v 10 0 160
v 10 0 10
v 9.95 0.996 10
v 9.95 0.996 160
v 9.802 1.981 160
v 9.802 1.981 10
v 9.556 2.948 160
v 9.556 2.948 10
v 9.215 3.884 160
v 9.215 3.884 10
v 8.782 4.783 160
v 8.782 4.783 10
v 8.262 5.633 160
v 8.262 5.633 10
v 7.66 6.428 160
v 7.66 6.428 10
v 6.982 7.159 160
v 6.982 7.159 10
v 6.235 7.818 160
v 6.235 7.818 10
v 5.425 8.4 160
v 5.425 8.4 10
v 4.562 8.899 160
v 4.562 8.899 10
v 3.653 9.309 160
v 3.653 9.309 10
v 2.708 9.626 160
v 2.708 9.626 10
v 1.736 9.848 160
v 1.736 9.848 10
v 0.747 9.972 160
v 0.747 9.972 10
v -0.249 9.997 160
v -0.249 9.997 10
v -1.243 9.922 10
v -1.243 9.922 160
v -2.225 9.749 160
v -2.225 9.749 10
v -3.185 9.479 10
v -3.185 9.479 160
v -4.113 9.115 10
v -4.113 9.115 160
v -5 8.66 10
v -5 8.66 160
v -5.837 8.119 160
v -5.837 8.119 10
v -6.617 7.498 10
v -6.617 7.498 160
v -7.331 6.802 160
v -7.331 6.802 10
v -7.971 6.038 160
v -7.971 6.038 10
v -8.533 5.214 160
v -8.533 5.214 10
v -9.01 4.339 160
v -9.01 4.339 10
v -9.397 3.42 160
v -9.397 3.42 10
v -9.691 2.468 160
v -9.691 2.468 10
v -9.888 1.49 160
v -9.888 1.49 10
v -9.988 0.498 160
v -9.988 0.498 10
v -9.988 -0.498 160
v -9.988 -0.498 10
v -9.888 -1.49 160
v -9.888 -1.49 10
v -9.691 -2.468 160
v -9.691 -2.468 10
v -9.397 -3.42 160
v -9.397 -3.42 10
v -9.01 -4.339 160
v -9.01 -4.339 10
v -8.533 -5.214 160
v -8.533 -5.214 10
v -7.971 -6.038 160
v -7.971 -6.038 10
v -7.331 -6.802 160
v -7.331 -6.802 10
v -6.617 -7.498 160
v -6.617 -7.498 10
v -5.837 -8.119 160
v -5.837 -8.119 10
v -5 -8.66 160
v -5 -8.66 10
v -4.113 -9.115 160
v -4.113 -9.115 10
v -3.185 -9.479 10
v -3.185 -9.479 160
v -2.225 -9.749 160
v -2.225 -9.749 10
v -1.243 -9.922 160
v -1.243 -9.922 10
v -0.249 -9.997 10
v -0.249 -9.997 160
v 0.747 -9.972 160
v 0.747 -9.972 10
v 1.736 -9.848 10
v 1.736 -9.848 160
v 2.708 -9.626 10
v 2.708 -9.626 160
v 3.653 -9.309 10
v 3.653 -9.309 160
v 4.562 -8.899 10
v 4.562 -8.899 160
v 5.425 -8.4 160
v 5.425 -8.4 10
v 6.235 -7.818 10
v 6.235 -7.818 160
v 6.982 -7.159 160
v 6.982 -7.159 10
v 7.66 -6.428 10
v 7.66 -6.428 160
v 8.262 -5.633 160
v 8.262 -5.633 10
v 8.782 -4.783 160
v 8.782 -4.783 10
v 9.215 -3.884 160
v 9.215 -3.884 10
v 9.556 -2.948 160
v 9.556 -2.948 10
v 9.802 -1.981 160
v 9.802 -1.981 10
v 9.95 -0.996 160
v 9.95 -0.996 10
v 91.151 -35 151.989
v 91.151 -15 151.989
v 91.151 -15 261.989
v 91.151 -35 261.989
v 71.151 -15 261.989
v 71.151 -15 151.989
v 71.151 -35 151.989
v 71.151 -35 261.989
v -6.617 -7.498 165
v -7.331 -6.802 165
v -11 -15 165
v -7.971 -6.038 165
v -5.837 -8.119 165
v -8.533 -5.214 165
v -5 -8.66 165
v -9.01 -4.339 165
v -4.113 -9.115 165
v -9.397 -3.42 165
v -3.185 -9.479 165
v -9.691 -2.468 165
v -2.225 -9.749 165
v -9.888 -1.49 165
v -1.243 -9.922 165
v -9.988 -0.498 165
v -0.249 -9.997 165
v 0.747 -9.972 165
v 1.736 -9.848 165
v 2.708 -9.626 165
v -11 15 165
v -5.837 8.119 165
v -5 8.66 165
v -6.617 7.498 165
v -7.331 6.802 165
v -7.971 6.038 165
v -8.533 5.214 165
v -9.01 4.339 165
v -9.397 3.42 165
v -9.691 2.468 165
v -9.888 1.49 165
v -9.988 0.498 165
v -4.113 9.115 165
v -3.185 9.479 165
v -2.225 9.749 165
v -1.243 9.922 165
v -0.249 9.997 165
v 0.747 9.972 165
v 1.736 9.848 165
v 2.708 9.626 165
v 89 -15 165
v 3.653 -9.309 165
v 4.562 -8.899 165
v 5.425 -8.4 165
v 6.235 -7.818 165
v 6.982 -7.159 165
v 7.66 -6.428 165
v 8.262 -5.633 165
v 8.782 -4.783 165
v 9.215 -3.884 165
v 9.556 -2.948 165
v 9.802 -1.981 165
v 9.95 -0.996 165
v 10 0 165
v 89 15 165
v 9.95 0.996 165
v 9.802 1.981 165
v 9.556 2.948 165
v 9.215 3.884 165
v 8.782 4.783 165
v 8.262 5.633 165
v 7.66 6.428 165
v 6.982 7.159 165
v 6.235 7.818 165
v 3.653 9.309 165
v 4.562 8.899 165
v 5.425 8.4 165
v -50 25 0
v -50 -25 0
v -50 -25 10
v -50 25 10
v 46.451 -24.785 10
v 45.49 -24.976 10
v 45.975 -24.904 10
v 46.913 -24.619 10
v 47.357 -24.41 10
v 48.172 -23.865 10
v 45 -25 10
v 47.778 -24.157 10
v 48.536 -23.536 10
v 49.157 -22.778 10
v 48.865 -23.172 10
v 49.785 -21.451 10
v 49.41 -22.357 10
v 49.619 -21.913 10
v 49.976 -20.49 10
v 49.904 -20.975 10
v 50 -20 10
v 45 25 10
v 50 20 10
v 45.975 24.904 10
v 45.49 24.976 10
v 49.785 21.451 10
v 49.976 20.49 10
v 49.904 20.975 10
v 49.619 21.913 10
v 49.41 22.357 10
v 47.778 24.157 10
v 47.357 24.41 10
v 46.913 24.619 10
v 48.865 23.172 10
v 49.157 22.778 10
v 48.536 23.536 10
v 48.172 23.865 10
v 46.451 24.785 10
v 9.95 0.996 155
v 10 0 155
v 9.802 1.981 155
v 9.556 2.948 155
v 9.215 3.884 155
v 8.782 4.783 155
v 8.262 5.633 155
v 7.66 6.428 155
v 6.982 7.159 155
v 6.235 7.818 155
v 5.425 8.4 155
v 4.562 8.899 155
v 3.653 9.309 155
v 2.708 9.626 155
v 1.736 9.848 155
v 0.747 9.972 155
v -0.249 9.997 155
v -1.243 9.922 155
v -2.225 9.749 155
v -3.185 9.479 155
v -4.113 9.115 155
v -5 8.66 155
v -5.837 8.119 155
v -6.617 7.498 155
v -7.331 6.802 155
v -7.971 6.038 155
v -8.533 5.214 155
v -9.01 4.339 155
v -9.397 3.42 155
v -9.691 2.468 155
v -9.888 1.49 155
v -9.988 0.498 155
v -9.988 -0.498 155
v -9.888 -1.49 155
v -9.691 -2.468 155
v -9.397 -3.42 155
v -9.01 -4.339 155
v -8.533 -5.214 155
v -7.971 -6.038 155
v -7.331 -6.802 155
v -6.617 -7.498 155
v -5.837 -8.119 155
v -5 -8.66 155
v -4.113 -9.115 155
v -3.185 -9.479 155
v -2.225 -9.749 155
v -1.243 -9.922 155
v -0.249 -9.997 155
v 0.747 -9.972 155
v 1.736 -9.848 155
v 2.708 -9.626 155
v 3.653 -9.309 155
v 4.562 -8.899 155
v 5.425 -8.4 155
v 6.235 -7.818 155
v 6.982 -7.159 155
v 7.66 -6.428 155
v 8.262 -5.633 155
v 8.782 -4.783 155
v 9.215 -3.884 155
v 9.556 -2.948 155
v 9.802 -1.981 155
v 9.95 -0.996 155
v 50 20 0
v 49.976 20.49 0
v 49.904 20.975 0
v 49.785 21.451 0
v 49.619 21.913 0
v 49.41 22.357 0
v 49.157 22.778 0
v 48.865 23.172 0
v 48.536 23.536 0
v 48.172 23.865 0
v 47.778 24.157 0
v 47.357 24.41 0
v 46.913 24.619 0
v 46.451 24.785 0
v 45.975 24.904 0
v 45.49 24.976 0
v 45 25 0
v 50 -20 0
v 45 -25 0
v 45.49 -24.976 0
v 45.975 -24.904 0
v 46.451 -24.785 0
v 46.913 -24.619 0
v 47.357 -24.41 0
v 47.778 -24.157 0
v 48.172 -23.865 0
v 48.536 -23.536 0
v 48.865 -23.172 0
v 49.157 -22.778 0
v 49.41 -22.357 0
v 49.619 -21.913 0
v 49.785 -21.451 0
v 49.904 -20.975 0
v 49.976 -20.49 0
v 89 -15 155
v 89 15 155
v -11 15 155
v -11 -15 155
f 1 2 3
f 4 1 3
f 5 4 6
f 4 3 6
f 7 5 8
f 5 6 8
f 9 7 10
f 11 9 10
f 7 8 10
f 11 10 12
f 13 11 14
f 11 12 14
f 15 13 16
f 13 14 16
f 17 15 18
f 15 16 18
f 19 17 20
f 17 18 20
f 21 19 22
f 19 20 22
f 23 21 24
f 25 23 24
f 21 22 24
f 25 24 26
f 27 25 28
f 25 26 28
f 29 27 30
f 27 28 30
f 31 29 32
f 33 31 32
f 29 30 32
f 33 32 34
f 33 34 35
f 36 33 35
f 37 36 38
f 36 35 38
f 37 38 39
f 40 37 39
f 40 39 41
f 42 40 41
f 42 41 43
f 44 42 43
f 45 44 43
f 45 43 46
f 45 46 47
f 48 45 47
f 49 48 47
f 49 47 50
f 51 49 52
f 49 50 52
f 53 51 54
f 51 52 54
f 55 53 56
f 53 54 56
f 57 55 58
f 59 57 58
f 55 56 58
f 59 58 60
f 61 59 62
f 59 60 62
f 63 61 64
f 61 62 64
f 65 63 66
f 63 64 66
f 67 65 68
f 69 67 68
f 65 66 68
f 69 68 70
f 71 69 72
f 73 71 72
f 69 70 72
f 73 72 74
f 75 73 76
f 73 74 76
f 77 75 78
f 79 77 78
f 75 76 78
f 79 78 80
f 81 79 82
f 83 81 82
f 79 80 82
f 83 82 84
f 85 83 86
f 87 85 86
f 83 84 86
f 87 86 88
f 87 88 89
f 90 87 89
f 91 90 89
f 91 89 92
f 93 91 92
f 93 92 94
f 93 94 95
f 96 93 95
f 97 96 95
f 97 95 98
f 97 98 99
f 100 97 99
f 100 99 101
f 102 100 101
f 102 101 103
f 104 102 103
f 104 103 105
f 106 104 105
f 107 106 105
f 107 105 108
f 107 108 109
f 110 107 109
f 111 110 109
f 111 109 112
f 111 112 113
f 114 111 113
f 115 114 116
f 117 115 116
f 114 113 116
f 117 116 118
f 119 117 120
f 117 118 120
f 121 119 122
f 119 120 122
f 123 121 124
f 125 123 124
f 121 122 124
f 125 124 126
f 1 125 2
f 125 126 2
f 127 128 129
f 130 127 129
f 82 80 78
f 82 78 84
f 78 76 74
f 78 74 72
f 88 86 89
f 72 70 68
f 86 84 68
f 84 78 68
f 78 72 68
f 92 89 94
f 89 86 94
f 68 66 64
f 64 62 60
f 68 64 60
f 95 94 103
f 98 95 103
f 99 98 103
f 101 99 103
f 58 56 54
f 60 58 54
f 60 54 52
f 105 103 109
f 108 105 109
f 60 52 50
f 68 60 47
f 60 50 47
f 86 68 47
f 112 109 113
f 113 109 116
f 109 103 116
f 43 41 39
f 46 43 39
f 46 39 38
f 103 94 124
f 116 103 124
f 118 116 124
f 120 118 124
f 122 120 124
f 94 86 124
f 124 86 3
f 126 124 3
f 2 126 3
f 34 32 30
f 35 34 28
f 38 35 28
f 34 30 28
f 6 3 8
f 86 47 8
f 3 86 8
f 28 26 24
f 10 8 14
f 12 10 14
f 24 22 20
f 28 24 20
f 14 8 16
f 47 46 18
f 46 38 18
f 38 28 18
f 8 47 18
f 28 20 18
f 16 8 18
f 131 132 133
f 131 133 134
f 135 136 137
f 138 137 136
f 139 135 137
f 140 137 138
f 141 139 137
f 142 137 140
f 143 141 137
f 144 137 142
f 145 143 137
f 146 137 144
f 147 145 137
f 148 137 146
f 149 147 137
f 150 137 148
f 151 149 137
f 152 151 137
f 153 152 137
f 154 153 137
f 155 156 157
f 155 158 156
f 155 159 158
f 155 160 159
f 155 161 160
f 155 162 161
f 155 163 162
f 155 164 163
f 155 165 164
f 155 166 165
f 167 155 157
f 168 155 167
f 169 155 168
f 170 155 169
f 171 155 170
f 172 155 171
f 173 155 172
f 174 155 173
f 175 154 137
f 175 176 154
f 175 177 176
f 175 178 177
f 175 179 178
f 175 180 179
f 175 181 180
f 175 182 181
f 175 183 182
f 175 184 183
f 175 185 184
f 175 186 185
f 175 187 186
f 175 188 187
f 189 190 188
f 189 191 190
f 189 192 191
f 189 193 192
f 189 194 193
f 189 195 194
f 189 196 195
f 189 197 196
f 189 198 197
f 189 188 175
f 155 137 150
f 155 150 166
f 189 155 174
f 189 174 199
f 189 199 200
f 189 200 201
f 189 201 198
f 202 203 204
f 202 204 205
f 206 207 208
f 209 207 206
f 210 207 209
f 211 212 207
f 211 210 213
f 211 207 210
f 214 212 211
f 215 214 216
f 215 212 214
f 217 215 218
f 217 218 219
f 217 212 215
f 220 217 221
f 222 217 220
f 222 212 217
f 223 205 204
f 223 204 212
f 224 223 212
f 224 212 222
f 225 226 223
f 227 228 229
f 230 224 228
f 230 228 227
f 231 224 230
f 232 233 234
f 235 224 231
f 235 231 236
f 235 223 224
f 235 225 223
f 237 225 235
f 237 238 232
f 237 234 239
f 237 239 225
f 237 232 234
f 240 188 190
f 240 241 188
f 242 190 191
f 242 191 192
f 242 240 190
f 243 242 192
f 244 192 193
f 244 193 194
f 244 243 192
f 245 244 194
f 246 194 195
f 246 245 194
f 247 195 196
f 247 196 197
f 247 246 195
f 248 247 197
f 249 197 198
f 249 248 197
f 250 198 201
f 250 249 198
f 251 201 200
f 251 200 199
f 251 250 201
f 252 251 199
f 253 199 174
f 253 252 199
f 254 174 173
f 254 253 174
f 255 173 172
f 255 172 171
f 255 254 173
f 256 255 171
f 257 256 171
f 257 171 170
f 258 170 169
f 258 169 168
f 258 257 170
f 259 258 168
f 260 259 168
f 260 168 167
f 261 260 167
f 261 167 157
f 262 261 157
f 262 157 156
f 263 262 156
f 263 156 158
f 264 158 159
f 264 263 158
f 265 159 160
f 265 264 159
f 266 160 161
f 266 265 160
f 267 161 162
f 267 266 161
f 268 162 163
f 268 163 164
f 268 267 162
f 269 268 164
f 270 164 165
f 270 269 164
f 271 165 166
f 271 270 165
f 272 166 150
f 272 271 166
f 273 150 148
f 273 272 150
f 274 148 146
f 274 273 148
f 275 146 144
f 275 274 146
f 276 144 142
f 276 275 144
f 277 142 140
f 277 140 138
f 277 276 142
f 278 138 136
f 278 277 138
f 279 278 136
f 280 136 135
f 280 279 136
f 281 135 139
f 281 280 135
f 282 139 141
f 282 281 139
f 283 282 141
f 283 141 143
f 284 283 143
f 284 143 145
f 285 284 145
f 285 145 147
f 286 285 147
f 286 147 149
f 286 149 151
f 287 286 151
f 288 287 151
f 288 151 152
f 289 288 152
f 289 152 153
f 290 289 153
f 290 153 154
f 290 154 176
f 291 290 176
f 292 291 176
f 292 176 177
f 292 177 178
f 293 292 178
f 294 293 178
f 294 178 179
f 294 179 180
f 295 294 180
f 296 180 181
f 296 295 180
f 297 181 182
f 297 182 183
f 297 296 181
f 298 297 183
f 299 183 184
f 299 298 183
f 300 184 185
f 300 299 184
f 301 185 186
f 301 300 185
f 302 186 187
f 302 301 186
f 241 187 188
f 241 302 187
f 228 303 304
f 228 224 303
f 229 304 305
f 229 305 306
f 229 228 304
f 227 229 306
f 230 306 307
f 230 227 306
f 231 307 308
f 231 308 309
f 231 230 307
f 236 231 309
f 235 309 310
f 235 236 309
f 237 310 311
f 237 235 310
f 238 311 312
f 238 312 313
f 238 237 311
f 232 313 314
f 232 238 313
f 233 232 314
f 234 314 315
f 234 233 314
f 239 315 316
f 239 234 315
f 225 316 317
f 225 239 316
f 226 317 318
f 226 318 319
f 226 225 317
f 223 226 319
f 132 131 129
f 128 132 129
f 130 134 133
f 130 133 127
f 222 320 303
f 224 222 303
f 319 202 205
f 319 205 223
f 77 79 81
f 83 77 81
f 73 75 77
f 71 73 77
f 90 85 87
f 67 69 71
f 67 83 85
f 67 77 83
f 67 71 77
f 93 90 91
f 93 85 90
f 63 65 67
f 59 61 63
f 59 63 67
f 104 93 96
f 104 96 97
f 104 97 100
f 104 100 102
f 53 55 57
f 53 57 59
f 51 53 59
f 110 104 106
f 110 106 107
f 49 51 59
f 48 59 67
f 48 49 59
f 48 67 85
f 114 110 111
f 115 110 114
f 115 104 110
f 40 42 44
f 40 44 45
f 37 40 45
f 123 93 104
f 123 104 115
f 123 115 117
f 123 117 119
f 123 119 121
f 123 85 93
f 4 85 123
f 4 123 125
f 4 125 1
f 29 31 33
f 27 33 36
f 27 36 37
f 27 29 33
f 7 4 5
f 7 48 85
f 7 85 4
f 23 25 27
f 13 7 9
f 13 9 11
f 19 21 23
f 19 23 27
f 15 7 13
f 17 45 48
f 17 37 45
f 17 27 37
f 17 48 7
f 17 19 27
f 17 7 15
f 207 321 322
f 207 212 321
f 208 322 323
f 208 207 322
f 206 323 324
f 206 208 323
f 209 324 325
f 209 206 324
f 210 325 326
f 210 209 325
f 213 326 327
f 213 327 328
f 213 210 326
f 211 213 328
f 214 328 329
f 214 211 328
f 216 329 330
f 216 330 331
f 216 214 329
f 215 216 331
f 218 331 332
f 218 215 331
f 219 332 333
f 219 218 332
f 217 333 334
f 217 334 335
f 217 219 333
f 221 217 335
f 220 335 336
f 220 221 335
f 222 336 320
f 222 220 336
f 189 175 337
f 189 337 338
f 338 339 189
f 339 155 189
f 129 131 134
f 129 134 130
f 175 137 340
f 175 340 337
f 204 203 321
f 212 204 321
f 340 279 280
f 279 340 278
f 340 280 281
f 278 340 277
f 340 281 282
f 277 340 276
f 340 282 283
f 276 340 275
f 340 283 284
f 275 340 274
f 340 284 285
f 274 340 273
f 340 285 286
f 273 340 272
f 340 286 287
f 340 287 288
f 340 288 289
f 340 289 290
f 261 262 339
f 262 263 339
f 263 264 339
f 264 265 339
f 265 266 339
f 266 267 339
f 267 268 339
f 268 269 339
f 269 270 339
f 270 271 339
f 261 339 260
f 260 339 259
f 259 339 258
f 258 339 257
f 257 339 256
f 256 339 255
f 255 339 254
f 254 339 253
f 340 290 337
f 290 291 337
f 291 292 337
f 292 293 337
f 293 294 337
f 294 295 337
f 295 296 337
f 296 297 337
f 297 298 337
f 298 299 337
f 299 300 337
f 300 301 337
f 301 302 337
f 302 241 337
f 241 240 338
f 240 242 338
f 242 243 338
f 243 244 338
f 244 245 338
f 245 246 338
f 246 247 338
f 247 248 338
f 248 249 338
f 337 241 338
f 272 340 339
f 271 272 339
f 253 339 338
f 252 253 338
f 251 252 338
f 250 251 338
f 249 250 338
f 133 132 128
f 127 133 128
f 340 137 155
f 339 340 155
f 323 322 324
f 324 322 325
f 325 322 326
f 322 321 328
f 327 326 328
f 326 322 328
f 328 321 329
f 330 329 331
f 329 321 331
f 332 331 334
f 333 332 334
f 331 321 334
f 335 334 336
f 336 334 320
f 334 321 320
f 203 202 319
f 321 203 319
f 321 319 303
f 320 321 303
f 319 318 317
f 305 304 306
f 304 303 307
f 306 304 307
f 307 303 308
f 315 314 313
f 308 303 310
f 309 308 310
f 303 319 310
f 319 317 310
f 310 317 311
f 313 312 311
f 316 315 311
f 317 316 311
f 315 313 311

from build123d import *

# Parameters (mm, degrees)
F0_W     = 100
F0_H     = 50
F1_DEPTH = 10
F2_R     = 5
F3_R     = 5
F4_R     = 10
F5_DEPTH = 150
F6_W     = 100
F6_H     = 30
F6_R     = 10
F7_DEPTH = 5
F8_W     = 20
F8_H     = 110
F9_DEPTH = 20


with BuildPart() as f1:
    # F0 (on Top) → F1 (new body)
    with BuildSketch(Plane.XY):
        Rectangle(F0_W, F0_H)
    extrude(amount=F1_DEPTH)

    # F2
    f2_edges = [f1.edges().sort_by_distance(p)[0] for p in [
        (50, -25, 5),
    ]]
    fillet(f2_edges, radius=F2_R)

    # F3
    f3_edges = [f1.edges().sort_by_distance(p)[0] for p in [
        (50, 25, 5),
    ]]
    fillet(f3_edges, radius=F3_R)


with BuildPart() as f5:
    # F4 (on face) → F5 (new body)
    with BuildSketch(Plane.XY.offset(10)):
        Circle(F4_R)
    extrude(amount=F5_DEPTH)


with BuildPart() as f7:
    # F6 (on face) → F7 (new body, symmetric)
    with BuildSketch(Plane.XY.offset(160)):
        with Locations((39, 0)):
            Rectangle(F6_W, F6_H)
        Circle(F6_R, mode=Mode.SUBTRACT)
    extrude(amount=F7_DEPTH, both=True)


with BuildPart() as f9:
    # F8 (on face) → F9 (new body)
    with BuildSketch(Plane.XZ.offset(15)):
        with Locations((81.150837, 206.98936)):
            Rectangle(F8_W, F8_H)
    extrude(amount=F9_DEPTH)


solid = Compound([f1.part, f5.part, f7.part, f9.part])
